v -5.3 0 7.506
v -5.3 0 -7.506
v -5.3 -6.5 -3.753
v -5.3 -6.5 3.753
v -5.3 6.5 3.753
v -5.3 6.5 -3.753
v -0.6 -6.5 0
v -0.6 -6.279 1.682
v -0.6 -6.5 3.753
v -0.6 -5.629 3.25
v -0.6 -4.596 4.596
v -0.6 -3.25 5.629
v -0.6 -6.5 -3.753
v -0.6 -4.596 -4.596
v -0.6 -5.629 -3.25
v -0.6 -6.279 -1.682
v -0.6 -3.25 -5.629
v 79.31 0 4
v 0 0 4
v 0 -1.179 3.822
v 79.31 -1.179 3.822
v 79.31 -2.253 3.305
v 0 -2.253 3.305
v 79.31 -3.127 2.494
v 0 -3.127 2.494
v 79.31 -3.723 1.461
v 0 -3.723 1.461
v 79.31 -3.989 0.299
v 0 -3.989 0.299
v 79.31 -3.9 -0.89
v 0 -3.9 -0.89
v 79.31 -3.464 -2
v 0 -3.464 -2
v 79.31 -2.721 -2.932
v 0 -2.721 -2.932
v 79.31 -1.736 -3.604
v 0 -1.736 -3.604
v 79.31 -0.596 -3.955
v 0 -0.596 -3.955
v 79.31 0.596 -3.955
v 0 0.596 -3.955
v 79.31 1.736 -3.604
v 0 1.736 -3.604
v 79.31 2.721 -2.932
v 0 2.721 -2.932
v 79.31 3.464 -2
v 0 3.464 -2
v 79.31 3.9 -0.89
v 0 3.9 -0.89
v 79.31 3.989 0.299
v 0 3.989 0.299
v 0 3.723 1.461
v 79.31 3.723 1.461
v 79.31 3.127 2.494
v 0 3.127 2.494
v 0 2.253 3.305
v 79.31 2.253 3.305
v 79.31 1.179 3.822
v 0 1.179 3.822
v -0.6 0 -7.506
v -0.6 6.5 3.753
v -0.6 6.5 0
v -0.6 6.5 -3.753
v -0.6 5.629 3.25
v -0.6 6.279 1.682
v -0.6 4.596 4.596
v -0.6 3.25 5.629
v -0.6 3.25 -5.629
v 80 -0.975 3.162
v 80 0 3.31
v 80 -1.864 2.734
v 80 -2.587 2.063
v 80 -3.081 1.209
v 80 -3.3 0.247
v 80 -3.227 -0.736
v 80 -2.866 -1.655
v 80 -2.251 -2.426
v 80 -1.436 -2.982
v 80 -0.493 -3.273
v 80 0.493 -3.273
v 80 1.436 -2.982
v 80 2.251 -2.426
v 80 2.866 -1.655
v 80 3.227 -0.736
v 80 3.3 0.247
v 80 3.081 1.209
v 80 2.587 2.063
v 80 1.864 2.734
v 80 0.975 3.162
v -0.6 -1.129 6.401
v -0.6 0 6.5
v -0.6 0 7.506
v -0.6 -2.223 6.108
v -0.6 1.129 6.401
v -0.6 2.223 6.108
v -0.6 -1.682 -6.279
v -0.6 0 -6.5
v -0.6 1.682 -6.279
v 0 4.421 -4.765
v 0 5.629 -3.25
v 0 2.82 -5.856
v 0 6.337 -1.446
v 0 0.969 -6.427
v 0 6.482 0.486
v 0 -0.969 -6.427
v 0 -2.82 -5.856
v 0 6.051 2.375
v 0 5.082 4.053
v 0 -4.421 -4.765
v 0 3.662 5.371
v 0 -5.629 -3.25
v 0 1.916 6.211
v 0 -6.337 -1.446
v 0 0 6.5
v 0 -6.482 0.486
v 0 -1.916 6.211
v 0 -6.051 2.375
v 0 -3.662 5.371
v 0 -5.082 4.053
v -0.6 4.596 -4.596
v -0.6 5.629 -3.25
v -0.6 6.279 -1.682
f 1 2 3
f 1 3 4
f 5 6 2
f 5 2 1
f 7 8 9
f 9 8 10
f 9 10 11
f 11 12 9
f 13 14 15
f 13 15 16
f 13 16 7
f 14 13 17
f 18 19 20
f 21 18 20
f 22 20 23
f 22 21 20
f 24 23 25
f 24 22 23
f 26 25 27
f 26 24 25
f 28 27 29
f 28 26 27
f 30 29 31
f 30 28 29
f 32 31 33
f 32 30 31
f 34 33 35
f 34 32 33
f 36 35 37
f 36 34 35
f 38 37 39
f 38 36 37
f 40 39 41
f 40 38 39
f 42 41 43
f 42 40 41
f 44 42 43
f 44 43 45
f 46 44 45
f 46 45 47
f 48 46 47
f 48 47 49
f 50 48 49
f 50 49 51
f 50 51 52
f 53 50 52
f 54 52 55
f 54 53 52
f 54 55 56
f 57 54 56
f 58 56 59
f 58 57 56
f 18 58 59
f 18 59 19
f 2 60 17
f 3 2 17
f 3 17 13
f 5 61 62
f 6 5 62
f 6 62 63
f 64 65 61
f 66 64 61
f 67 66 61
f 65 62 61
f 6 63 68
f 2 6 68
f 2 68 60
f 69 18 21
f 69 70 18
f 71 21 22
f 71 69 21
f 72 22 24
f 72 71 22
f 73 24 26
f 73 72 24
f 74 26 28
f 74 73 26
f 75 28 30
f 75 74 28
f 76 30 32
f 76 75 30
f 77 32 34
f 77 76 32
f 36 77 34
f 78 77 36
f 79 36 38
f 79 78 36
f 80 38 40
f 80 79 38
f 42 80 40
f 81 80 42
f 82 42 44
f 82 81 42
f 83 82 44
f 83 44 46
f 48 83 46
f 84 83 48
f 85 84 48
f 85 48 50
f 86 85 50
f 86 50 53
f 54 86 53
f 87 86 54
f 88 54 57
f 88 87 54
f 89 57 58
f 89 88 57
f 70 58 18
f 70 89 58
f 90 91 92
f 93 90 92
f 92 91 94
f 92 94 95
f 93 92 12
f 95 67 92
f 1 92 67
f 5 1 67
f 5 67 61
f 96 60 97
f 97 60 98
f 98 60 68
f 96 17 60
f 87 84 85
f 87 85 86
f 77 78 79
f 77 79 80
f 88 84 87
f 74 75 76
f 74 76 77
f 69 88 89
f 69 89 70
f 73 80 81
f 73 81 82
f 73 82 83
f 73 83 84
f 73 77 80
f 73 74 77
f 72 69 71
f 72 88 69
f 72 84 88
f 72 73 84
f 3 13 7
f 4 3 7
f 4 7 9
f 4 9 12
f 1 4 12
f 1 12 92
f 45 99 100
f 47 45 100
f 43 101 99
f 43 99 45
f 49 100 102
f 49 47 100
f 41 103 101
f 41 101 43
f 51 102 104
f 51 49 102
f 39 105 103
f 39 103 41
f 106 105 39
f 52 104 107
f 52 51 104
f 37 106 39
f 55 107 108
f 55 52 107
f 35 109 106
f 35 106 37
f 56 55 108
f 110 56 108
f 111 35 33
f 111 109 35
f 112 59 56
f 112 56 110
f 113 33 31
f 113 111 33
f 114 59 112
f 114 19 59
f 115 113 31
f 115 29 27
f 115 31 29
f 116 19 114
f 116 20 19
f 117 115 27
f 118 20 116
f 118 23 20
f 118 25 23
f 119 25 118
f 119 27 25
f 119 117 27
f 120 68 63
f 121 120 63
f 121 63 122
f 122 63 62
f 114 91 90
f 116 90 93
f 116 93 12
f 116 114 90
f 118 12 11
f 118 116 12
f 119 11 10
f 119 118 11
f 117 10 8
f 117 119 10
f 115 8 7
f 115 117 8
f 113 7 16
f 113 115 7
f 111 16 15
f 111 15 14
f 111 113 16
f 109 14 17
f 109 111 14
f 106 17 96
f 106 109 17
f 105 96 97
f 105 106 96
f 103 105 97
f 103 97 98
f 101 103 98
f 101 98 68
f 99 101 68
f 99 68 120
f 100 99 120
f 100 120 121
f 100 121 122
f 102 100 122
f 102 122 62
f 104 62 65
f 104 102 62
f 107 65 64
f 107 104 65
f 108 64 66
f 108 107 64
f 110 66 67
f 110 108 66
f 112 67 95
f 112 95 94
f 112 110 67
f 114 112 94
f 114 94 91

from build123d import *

# Parameters (mm, degrees)
HEX_2_DEPTH = 4.7


with BuildPart() as part:
    # BodySketch → BaseBody (revolve)
    with BuildSketch(Plane(origin=(0, 0, 0), x_dir=(1, 0, 0), z_dir=(0, 1, 0)), mode=Mode.PRIVATE) as basebody_sk:
        Polygon((79.3095, 4), (80, 3.3095), (80, 0), (-0.6, 0), (-0.6, 6.5), (0, 6.5), (0, 4), align=None)
    revolve(basebody_sk.sketch.rotate(Axis((0, 0, 0), (1, 0, 0)), 180), axis=Axis((0, 0, 0), (1, 0, 0)))

    # HeadSketch → Hex 2 (add)
    with BuildSketch(Plane.ZY.offset(0.6)):
        Polygon((7.505553499, 0), (3.75277675, 6.5), (-3.75277675, 6.5), (-7.505553499, 0), (-3.75277675, -6.5), (3.75277675, -6.5), align=None)
    extrude(amount=HEX_2_DEPTH)


solid = part.part
